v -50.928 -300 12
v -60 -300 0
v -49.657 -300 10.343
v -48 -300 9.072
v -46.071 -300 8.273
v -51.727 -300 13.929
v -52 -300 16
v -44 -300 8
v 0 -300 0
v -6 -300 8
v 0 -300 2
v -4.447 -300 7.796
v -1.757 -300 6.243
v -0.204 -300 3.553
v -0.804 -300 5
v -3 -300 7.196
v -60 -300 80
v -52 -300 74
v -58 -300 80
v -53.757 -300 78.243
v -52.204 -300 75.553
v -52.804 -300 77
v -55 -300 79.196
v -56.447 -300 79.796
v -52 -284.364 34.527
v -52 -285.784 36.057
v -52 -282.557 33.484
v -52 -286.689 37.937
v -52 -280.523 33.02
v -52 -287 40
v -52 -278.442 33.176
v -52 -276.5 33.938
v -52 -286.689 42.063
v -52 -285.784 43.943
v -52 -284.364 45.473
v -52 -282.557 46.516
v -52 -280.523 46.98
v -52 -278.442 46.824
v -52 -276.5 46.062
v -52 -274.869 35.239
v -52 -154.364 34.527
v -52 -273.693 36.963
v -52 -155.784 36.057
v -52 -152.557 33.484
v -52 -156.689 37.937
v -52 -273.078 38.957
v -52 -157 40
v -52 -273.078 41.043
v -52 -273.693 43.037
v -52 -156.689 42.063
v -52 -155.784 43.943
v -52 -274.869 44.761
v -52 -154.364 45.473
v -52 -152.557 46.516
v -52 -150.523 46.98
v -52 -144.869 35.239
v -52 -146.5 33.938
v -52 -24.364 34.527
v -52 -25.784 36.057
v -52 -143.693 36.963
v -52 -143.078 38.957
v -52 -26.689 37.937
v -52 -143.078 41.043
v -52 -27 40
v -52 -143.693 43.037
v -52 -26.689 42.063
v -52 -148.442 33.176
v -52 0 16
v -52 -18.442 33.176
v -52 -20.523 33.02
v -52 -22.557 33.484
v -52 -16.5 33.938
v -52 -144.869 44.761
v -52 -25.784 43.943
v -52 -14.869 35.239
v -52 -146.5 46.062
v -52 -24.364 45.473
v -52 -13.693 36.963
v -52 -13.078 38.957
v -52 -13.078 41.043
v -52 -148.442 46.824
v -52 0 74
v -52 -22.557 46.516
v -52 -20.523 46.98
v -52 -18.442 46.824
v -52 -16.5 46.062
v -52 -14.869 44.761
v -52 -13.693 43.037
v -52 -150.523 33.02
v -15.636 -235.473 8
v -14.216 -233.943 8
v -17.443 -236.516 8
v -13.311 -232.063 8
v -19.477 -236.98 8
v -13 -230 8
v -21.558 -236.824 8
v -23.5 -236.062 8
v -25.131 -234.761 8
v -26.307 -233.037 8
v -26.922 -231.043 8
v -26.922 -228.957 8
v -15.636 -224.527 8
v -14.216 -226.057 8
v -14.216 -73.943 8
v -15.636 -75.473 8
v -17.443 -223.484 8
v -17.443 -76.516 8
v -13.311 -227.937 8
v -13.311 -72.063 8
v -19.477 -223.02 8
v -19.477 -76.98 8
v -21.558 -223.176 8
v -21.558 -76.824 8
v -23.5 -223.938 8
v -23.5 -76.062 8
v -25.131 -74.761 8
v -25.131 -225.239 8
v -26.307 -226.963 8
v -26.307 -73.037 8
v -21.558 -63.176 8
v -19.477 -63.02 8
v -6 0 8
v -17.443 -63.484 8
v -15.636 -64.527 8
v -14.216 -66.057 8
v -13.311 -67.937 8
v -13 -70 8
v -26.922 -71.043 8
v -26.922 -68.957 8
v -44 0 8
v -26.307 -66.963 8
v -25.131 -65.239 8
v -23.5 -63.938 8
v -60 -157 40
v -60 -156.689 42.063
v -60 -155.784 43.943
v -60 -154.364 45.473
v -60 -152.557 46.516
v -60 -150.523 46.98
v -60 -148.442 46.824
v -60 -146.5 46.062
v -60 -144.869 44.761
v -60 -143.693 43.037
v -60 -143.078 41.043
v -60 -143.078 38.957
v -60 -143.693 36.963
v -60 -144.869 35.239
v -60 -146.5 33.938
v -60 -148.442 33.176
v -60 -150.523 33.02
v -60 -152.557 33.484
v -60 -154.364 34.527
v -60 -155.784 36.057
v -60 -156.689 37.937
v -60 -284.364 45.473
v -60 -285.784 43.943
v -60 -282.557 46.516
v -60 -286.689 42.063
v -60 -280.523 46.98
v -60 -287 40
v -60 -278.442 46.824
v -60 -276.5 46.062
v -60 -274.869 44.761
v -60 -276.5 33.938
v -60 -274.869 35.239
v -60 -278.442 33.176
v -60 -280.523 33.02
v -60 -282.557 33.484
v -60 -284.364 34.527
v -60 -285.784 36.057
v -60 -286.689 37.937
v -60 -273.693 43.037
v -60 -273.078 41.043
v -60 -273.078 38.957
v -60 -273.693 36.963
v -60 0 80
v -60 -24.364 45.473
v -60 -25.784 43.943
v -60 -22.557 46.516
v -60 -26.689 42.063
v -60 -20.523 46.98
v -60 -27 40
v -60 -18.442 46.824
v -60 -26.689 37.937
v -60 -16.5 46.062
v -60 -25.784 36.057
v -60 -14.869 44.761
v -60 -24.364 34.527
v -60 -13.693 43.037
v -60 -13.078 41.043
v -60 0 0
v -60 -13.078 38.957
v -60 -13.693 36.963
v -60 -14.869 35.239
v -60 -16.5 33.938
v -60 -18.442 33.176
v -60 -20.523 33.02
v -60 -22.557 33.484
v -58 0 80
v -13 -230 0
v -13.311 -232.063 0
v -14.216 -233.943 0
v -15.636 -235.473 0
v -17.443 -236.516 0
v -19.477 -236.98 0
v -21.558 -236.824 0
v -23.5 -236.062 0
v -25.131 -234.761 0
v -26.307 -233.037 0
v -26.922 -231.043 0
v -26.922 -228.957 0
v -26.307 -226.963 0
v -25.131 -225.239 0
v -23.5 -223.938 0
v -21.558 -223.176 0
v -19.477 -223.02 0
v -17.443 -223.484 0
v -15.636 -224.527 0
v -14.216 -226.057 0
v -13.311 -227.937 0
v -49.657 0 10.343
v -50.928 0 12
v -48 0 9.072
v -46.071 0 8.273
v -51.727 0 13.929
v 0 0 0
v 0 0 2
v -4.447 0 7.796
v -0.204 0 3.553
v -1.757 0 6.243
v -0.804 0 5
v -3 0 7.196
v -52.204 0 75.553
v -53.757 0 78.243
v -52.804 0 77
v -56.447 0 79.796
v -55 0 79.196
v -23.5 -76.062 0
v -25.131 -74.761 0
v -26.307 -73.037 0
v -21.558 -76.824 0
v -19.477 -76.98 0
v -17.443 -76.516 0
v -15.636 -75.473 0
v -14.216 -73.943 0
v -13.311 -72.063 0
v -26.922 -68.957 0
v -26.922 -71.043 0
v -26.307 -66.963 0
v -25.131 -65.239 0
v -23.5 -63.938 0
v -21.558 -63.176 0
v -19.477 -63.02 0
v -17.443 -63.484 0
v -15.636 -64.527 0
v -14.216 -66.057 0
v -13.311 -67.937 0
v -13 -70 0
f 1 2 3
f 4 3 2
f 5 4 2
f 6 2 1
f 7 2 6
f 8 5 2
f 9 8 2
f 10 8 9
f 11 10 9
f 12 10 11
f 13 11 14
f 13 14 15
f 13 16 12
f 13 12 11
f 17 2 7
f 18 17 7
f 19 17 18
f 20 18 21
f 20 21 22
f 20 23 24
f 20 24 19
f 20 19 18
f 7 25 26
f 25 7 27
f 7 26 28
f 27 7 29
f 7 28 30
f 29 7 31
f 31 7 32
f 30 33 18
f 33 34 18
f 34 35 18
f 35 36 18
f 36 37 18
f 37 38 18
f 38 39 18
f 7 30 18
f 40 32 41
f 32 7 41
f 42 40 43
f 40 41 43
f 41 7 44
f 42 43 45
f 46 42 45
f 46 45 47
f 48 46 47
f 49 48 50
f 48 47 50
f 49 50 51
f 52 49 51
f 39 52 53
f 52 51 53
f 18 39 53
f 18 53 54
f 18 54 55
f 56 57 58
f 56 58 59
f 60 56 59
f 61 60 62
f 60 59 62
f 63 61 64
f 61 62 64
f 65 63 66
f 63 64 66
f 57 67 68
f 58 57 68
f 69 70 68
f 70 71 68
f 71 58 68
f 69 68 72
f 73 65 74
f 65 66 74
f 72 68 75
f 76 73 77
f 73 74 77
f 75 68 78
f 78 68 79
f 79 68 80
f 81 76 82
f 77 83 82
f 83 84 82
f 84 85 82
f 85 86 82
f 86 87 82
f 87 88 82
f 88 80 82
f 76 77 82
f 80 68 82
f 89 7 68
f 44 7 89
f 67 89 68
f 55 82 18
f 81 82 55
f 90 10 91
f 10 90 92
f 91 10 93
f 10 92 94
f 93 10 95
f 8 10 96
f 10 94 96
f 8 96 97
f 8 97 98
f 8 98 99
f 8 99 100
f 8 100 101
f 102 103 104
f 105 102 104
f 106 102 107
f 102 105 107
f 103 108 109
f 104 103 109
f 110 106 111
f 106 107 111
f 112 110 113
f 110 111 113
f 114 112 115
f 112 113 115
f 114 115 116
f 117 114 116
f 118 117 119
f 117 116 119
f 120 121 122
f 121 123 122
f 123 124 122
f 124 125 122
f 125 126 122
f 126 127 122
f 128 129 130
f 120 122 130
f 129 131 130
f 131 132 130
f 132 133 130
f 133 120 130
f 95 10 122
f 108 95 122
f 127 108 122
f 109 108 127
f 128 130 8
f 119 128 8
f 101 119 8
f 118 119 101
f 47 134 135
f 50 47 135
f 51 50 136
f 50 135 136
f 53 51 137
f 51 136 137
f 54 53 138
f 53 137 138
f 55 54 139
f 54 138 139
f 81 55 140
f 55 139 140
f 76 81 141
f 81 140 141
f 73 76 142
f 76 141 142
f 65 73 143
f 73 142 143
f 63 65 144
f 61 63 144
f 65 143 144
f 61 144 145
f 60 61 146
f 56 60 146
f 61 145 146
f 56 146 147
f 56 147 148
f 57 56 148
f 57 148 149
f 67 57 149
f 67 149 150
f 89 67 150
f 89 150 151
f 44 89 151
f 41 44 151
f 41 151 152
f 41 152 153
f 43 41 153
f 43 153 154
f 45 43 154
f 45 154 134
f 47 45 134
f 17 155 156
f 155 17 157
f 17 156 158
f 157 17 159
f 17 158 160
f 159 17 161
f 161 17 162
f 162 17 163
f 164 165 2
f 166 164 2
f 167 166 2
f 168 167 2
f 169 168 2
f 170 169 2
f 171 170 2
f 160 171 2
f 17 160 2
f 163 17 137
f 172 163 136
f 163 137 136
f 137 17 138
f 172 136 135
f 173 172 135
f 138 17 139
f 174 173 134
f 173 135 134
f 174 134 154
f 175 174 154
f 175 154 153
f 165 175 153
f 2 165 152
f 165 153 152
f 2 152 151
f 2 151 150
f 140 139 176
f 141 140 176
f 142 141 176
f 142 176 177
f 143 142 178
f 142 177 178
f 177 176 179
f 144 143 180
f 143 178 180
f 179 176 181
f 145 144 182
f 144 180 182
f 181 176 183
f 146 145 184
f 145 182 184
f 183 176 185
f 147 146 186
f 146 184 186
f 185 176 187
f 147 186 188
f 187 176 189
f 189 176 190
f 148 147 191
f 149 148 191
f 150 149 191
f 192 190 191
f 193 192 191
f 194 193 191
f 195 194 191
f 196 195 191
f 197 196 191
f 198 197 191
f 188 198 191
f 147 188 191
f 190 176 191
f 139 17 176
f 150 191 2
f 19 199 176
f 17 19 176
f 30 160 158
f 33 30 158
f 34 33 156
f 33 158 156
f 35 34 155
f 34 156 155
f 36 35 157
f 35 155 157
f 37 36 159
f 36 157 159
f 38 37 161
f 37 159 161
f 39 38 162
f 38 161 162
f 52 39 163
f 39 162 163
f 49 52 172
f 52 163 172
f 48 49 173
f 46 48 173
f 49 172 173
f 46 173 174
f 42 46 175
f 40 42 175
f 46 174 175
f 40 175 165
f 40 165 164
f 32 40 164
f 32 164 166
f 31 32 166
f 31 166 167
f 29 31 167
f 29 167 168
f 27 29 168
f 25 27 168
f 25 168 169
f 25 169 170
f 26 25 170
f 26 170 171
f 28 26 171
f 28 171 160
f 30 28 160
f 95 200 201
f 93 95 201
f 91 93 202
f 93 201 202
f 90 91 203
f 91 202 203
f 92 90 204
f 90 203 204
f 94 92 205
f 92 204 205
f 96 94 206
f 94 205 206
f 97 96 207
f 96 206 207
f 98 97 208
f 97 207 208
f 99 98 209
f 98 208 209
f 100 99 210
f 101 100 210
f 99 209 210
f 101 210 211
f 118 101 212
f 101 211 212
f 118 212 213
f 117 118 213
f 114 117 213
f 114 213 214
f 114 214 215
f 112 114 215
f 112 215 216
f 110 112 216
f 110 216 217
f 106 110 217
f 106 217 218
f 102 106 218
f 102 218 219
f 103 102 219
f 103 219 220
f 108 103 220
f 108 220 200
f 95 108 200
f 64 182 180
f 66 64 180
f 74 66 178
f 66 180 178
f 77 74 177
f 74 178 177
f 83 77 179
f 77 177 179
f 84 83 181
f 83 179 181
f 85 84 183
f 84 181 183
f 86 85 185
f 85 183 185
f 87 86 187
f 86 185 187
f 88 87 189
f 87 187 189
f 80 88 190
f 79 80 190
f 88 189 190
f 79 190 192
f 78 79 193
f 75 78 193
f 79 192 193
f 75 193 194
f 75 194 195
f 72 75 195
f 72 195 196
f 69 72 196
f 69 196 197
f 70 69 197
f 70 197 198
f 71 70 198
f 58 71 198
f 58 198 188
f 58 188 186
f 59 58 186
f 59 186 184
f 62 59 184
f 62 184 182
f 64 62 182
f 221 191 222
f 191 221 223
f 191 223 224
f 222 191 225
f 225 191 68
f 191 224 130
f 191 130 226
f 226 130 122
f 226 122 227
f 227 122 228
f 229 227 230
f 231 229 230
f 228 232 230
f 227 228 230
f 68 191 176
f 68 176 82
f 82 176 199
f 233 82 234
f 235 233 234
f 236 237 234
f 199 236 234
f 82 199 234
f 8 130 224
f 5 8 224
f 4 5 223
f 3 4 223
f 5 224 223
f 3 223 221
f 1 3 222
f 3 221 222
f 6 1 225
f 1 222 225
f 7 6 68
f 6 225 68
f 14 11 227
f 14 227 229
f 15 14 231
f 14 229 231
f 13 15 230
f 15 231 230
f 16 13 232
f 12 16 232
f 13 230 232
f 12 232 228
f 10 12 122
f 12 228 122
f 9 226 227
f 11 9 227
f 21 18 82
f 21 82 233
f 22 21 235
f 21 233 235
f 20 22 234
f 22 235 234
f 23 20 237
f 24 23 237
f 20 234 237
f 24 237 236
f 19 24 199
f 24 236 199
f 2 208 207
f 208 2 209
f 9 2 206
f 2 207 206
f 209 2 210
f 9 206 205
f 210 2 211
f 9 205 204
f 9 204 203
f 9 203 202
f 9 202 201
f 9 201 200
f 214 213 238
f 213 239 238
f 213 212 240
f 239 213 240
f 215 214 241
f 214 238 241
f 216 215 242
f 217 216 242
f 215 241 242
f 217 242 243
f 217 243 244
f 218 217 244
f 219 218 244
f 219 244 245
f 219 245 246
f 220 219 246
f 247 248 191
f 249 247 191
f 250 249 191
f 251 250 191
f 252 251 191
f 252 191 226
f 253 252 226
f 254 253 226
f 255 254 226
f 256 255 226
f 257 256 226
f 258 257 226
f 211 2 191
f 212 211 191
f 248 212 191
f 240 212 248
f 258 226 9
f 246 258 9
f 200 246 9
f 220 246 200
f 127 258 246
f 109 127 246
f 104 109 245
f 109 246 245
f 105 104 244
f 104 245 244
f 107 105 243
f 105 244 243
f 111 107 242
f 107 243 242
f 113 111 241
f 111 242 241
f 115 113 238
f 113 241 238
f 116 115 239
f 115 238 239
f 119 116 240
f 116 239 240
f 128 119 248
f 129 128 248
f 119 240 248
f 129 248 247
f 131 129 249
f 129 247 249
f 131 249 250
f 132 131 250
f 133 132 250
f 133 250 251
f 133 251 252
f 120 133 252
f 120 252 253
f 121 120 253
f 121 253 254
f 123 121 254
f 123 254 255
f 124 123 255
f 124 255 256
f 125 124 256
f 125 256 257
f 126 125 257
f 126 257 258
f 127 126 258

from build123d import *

# Parameters (mm, degrees)
F1_DEPTH = 300
F2_R     = 7
F3_DEPTH = 25
F4_R     = 7
F5_DEPTH = 25


with BuildPart() as f1:
    # F0 (on Front) → F1 (new body)
    with BuildSketch(Plane.XZ):
        with BuildLine():
            Line((-60, 0), (0, 0))
            Line((0, 0), (0, 2))
            ThreePointArc((0, 2), (-1.757359, 6.242641), (-6, 8))
            Line((-6, 8), (-44, 8))
            ThreePointArc((-44, 8), (-49.656854, 10.343146), (-52, 16))
            Line((-52, 16), (-52, 74))
            ThreePointArc((-52, 74), (-53.757359, 78.242641), (-58, 80))
            Line((-58, 80), (-60, 80))
            Line((-60, 80), (-60, 0))
        make_face()
    extrude(amount=F1_DEPTH)

    # F2 (on face) → F3 (cut)
    with BuildSketch(Plane(origin=(-60, 0, 0), x_dir=(0, -1, 0), z_dir=(-1, 0, 0))):
        with Locations((20, 40)):
            Circle(F2_R)
        with Locations((150, 40)):
            Circle(F2_R)
        with Locations((280, 40)):
            Circle(F2_R)
    extrude(amount=-F3_DEPTH, mode=Mode.SUBTRACT)

    # F4 (on face) → F5 (cut)
    with BuildSketch(Plane(origin=(0, 0, 0), x_dir=(1, 0, 0), z_dir=(0, 0, -1))):
        with Locations((-20, 70)):
            Circle(F4_R)
        with Locations((-20, 230)):
            Circle(F4_R)
    extrude(amount=-F5_DEPTH, mode=Mode.SUBTRACT)


solid = f1.part
